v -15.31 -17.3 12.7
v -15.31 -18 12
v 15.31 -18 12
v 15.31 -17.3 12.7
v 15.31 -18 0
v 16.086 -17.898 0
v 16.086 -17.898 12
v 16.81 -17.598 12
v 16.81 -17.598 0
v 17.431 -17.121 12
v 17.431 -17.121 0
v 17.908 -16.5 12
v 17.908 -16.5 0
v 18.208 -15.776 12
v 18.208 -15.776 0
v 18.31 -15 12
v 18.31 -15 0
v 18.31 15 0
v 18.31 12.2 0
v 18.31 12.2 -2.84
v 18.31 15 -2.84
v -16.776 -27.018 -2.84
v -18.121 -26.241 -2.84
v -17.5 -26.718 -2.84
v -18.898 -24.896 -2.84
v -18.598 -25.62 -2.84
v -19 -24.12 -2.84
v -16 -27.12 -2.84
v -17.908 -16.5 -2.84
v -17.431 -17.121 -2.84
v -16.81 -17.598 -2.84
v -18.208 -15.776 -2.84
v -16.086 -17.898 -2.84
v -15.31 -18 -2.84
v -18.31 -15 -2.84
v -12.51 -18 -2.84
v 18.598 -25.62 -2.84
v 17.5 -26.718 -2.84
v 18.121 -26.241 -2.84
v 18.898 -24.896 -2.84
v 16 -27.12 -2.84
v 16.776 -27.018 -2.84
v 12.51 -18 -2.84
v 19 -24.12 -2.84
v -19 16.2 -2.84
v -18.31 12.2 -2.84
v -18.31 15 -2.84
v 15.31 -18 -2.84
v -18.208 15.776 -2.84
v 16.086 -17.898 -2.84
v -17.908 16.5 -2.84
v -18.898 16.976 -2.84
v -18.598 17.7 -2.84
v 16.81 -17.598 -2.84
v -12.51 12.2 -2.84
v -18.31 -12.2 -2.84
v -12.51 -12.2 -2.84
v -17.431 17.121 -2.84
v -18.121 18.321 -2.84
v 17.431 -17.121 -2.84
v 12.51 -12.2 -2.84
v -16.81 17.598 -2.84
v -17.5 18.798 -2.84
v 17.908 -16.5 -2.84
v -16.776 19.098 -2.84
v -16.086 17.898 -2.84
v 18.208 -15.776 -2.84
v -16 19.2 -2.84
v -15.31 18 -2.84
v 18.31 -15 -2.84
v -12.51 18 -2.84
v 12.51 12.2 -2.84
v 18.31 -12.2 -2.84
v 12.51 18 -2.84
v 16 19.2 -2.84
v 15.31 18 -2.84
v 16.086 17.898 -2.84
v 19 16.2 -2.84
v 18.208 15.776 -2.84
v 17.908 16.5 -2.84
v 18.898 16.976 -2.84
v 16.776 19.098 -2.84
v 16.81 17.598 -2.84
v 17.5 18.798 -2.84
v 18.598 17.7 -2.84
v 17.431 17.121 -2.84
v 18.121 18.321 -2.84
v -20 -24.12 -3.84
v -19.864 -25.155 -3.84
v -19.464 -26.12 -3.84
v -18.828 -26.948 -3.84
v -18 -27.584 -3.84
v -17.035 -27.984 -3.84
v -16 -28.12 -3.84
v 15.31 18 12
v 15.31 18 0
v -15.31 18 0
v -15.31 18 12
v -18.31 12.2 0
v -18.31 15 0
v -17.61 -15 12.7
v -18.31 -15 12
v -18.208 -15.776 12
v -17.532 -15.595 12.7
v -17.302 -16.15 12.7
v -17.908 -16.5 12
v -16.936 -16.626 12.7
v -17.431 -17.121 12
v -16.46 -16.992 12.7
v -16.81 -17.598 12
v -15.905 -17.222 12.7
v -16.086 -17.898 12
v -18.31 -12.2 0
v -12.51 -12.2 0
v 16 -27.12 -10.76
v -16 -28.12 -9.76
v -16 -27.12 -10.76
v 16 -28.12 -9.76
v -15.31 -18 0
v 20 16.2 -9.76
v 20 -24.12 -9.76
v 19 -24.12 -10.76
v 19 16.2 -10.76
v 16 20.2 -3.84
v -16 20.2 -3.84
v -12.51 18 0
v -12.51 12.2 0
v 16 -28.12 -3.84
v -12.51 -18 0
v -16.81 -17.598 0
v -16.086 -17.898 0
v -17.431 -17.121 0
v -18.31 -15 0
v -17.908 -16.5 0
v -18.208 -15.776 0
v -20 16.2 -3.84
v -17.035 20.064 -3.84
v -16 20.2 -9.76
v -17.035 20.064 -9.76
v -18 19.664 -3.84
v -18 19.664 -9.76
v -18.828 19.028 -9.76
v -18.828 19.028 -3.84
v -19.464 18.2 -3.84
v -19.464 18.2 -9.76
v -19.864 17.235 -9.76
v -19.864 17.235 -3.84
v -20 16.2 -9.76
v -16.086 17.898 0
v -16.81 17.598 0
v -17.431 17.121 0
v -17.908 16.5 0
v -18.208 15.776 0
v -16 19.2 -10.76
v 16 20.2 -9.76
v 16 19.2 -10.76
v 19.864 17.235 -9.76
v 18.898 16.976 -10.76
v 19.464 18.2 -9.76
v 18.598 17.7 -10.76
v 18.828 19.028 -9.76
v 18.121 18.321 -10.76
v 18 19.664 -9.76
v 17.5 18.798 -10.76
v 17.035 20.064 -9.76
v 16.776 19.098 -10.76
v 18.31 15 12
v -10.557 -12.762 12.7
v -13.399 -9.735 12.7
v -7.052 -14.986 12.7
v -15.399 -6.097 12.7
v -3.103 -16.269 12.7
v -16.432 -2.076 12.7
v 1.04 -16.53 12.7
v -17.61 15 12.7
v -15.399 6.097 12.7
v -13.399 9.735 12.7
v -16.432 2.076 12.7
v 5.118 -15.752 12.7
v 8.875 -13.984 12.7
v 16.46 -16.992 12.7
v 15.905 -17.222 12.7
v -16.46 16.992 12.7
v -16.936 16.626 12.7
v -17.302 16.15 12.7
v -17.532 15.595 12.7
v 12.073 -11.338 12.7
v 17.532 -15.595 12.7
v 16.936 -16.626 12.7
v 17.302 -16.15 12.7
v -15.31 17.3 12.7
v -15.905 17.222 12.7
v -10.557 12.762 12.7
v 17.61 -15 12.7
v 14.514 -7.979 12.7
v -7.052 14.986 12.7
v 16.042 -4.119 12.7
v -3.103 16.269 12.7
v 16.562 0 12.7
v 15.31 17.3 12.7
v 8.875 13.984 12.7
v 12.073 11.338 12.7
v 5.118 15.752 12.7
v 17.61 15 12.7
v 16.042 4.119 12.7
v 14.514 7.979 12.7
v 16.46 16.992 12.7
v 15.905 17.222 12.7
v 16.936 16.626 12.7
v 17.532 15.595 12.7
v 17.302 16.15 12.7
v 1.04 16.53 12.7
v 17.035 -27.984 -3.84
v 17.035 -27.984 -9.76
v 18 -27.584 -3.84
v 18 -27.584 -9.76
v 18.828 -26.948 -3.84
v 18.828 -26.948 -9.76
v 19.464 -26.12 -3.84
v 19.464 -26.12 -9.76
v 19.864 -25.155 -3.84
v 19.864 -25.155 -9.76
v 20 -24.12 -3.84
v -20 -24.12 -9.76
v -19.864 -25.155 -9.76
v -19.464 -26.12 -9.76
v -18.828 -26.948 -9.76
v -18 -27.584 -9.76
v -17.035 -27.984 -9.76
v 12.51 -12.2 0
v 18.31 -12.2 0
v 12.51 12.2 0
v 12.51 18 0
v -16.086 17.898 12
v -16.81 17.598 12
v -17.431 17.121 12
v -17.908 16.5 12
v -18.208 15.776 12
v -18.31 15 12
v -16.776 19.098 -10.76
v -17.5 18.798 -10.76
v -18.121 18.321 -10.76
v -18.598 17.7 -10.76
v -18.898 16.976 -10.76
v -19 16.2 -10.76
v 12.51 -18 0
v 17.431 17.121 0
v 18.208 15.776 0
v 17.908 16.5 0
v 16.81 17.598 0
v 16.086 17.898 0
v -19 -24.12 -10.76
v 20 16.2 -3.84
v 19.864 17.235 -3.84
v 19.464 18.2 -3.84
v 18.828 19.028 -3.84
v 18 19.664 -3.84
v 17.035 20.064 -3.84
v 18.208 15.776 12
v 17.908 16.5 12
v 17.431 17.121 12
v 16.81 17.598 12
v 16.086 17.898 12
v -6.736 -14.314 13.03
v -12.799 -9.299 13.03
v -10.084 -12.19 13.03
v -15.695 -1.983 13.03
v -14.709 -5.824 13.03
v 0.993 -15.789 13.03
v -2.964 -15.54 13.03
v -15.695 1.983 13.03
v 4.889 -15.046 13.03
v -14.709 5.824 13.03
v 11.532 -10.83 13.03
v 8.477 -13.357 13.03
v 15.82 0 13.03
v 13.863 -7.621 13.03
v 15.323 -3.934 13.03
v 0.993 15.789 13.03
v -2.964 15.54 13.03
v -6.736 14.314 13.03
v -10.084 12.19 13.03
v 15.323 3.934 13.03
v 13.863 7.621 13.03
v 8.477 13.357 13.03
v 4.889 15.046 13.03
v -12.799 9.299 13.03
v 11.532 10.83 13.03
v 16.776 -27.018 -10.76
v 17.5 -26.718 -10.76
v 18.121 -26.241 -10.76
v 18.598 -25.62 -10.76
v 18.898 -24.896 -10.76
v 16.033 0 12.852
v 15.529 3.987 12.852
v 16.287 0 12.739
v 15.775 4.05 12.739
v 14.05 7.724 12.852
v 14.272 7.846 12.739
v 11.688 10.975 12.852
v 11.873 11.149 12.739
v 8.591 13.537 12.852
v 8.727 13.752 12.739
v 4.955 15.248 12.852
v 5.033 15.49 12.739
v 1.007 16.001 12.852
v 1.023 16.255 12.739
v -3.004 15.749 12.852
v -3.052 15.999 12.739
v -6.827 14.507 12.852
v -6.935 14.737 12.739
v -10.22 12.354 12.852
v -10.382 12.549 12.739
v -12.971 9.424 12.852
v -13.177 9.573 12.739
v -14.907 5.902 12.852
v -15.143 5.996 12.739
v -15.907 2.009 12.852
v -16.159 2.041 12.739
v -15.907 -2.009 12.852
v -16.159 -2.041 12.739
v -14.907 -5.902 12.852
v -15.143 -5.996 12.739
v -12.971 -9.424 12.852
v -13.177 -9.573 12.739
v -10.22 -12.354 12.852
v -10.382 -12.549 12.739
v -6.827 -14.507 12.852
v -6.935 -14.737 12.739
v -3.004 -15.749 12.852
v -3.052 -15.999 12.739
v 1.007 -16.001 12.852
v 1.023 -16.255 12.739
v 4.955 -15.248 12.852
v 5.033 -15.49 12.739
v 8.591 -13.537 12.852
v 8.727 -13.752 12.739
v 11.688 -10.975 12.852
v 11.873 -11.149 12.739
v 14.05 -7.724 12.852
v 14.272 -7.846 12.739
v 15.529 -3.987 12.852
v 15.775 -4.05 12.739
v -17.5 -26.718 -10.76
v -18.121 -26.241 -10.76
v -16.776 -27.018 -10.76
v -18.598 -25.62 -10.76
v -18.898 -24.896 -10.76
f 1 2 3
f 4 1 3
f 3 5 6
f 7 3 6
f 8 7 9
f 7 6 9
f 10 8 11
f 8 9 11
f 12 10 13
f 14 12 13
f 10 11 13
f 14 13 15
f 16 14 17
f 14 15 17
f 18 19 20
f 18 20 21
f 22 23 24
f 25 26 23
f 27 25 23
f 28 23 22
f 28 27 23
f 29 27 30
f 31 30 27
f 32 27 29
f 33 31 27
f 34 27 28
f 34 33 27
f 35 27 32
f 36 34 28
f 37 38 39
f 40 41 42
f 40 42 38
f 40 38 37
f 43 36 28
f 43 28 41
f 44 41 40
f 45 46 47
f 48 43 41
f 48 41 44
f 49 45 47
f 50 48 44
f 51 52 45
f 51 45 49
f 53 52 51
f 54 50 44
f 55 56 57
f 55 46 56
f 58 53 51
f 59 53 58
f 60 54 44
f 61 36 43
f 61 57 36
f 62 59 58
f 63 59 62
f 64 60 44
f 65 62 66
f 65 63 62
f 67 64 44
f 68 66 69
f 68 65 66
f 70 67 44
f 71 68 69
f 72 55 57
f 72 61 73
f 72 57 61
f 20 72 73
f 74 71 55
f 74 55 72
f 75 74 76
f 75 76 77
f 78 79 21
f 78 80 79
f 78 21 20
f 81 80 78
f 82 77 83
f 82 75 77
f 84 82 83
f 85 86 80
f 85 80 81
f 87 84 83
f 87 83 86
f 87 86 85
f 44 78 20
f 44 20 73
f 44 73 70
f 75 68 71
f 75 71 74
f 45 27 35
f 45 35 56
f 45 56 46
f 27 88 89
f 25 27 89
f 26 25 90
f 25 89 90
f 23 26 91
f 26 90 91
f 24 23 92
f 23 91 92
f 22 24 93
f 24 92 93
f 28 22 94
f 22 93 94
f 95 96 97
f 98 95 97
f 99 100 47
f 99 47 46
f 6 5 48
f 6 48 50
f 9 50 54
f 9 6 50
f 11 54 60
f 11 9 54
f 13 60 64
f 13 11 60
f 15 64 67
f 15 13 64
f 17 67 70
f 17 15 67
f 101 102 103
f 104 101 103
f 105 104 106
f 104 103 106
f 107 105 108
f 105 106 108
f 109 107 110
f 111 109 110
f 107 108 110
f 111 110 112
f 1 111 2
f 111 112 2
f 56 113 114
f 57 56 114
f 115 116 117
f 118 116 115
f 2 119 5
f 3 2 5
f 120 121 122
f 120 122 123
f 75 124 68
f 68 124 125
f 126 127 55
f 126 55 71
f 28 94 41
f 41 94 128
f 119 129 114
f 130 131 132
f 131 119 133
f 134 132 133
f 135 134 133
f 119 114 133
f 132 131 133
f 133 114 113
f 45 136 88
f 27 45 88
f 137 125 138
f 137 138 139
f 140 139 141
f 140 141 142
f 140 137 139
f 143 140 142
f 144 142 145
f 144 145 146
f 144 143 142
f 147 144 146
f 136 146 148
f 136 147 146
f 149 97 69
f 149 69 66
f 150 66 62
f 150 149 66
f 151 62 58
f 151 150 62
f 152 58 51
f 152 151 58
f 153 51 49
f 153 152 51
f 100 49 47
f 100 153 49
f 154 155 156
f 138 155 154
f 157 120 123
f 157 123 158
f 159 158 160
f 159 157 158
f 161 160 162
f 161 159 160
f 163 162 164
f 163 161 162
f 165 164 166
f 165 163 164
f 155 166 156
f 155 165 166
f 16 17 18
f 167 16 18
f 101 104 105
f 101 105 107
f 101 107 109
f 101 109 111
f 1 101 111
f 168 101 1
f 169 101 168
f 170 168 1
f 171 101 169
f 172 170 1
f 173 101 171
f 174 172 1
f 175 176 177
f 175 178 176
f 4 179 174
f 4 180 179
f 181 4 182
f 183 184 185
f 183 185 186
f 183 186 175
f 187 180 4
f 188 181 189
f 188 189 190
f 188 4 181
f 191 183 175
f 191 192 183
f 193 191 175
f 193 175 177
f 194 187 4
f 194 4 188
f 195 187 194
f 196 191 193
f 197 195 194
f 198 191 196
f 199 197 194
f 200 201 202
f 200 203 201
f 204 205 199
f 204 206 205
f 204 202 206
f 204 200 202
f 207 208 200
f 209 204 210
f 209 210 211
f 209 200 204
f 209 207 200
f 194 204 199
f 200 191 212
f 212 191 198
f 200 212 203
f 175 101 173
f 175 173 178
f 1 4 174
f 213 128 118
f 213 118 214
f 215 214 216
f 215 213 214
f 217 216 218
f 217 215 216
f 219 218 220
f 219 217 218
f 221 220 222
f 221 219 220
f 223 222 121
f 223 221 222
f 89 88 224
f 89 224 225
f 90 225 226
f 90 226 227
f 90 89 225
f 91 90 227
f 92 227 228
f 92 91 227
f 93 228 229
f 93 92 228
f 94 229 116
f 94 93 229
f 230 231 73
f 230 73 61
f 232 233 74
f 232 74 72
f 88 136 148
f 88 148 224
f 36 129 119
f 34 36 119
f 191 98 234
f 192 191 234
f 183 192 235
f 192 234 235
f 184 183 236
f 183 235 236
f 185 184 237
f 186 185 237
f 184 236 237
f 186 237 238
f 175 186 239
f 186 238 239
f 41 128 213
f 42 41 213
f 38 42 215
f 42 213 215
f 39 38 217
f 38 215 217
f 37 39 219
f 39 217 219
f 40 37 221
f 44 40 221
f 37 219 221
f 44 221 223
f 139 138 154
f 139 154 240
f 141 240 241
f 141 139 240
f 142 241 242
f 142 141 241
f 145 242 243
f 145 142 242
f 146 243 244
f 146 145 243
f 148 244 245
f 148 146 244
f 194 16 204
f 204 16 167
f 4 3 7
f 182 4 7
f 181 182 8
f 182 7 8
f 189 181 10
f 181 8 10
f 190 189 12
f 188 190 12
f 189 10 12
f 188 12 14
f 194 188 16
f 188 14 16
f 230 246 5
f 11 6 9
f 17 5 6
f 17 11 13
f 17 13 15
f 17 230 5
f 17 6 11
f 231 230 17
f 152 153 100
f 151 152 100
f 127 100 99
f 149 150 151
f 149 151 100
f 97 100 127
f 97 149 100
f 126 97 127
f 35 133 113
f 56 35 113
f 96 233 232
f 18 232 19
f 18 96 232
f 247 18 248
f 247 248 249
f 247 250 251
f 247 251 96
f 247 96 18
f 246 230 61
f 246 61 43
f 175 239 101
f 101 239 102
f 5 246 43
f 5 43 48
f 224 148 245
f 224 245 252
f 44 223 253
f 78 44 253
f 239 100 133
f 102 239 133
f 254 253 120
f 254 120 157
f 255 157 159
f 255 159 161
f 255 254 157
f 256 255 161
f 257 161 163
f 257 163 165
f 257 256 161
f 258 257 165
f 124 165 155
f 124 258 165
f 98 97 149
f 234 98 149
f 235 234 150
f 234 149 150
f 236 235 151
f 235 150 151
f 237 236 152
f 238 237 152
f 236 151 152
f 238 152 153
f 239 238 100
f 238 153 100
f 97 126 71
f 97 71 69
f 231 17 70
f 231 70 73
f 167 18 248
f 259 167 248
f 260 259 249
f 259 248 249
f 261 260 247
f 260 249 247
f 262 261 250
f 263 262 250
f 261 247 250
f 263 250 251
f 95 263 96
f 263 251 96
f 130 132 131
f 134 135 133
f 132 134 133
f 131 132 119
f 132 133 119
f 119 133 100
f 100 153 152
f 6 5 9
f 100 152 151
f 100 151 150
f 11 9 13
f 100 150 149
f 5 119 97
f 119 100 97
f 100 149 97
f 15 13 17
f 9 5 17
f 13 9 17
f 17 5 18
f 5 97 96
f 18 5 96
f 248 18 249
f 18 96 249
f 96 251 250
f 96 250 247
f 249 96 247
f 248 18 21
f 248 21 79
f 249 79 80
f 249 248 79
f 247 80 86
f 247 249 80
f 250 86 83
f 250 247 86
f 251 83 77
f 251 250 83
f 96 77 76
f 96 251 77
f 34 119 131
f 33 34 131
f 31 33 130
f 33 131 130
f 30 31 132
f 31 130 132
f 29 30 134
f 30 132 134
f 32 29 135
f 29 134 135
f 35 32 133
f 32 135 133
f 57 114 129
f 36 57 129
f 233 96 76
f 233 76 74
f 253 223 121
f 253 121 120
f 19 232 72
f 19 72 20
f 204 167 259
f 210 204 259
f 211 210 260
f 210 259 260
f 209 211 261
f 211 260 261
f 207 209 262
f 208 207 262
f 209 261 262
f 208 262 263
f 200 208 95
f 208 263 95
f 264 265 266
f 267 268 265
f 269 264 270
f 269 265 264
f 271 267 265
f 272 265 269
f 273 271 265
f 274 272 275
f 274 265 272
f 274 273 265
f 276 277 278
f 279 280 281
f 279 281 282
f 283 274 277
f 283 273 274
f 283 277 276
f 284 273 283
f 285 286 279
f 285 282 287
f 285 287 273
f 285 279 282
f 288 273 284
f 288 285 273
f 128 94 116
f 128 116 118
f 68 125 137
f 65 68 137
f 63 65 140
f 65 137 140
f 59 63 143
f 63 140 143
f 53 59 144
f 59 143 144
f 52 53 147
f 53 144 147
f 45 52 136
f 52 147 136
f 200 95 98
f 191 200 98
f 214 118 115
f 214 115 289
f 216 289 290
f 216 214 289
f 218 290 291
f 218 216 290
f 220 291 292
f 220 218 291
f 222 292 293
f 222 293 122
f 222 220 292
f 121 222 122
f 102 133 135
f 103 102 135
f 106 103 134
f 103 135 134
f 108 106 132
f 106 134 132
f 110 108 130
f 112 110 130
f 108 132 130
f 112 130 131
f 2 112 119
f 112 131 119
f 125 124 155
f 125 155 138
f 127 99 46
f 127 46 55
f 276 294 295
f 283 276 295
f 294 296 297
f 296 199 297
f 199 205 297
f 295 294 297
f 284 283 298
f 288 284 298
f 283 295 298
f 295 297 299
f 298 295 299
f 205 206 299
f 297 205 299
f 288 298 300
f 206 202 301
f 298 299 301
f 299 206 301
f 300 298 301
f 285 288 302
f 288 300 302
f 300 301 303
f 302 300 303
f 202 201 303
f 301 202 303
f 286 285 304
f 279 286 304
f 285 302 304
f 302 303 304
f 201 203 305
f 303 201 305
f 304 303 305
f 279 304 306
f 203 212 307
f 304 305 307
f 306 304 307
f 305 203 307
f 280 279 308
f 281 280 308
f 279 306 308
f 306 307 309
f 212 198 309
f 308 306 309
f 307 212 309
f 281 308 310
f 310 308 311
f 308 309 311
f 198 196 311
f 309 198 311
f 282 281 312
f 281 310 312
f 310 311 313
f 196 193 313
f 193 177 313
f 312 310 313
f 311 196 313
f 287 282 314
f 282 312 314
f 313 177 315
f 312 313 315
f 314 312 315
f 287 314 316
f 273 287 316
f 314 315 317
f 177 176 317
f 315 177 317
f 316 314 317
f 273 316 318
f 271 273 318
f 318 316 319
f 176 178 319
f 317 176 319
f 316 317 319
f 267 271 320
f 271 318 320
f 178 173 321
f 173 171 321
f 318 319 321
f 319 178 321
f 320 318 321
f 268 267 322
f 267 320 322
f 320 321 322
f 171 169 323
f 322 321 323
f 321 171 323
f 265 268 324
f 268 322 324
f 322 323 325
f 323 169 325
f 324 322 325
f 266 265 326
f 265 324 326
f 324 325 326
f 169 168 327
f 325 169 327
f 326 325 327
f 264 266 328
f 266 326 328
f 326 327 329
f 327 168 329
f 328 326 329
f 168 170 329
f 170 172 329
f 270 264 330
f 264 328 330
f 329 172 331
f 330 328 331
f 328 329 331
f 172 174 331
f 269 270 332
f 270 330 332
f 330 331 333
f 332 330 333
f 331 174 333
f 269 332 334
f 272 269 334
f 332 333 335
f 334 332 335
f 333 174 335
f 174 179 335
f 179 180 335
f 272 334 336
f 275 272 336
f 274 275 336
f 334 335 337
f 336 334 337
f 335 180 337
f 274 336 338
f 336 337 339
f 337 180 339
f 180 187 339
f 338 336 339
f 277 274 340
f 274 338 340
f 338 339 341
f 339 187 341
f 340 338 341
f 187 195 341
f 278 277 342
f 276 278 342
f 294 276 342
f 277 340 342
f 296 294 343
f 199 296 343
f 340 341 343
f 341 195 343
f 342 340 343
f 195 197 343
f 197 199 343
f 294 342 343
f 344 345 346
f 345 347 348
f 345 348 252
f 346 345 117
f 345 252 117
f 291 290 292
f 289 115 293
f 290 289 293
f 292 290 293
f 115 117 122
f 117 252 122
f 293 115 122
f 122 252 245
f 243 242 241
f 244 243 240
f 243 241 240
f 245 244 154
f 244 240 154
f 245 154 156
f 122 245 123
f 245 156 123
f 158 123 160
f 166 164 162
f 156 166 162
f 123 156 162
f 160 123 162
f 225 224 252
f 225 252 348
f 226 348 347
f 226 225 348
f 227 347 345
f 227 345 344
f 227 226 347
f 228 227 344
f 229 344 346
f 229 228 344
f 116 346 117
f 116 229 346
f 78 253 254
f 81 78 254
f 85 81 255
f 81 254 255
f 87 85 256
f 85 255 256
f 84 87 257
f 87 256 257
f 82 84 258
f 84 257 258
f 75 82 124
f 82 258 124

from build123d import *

# Parameters (mm, degrees)
BOSS_EXTRUDE1_DEPTH   = 12.7
SKETCH7_R             = 15.82
BOSS_EXTRUDE5_DEPTH   = 0.33
FILLET1_R             = 1
CHAMFER1_SIZE         = 0.7
BOSS_EXTRUDE6_DEPTH   = 2.84
BOSS_EXTRUDE6_2_DEPTH = 2.84
BOSS_EXTRUDE6_3_DEPTH = 2.84
BOSS_EXTRUDE6_4_DEPTH = 2.84
BOSS_EXTRUDE7_DEPTH   = 7.92
CHAMFER2_SIZE         = 1


with BuildPart() as part:
    # Sketch2 → Boss-Extrude1 (new body)
    with BuildSketch(Plane.XY):
        with BuildLine():
            Line((-15.31, -18), (15.31, -18))
            ThreePointArc((15.31, -18), (17.431320344, -17.121320344), (18.31, -15))
            Line((18.31, -15), (18.31, 15))
            ThreePointArc((18.31, 15), (17.431320344, 17.121320344), (15.31, 18))
            Line((15.31, 18), (-15.31, 18))
            ThreePointArc((-15.31, 18), (-17.431320344, 17.121320344), (-18.31, 15))
            Line((-18.31, 15), (-18.31, -15))
            ThreePointArc((-18.31, -15), (-17.431320344, -17.121320344), (-15.31, -18))
        make_face()
    extrude(amount=BOSS_EXTRUDE1_DEPTH)

    # Sketch7 → Boss-Extrude5 (add)
    with BuildSketch(Plane.XY.offset(12.7)):
        Circle(SKETCH7_R)
    extrude(amount=BOSS_EXTRUDE5_DEPTH)

    # Fillet1
    # the kernel refuses this fillet: 1 mm, written as the material it adds along each edge
    with BuildSketch(Plane(origin=(0, 0, 12.7), x_dir=(1, 0, 0), z_dir=(0, -1, 0))) as fillet1_piece_1:
        with BuildLine():
            CenterArc((16.562361098, 1), FILLET1_R, 222.067064802, 47.932935198)
            Line((15.82, 0.33), (15.805152778, 0.3166))
            ThreePointArc((15.805152778, 0.3166), (15.8, 0.165), (15.8, 0))
            Line((15.8, 0), (15.82, -0.02))
            Line((15.82, -0.02), (16.562361098, -0.02))
            Line((16.562361098, -0.02), (16.562361098, 0))
        make_face()
    revolve(axis=Axis((0, 0, 12.7), (0, 0, 1)))

    # Chamfer1
    chamfer1_edges = [part.edges().sort_by_distance(p)[0] for p in [
        (17.431320344, -17.121320344, 12.7),
        (18.31, 0, 12.7),
        (17.431320344, 17.121320344, 12.7),
        (0, 18, 12.7),
        (-17.431320344, 17.121320344, 12.7),
        (-18.31, 0, 12.7),
        (-17.431320344, -17.121320344, 12.7),
        (0, -18, 12.7),
    ]]
    chamfer(chamfer1_edges, length=CHAMFER1_SIZE)


with BuildPart() as body_2:
    # Sketch8 → Boss-Extrude6 (new body)
    with BuildSketch(Plane(origin=(0, 0, 0), x_dir=(-1, 0, 0), z_dir=(0, 0, -1))):
        with BuildLine():
            Line((-12.51, 12.2), (-18.31, 12.2))
            Line((-18.31, 12.2), (-18.31, 15))
            ThreePointArc((-18.31, 15), (-17.431320344, 17.121320344), (-15.31, 18))
            Line((-15.31, 18), (-12.51, 18))
            Line((-12.51, 18), (-12.51, 12.2))
        make_face()
    extrude(amount=BOSS_EXTRUDE6_DEPTH)



with BuildPart() as body_3:
    # Sketch8 → Boss-Extrude6 2 (new body)
    with BuildSketch(Plane(origin=(0, 0, 0), x_dir=(-1, 0, 0), z_dir=(0, 0, -1))):
        with BuildLine():
            Line((12.51, 18), (15.31, 18))
            ThreePointArc((15.31, 18), (17.431320344, 17.121320344), (18.31, 15))
            Line((18.31, 15), (18.31, 12.2))
            Line((18.31, 12.2), (12.51, 12.2))
            Line((12.51, 12.2), (12.51, 18))
        make_face()
    extrude(amount=BOSS_EXTRUDE6_2_DEPTH)


with BuildPart() as body_4:
    # Sketch8 → Boss-Extrude6 3 (new body)
    with BuildSketch(Plane(origin=(0, 0, 0), x_dir=(-1, 0, 0), z_dir=(0, 0, -1))):
        with BuildLine():
            Line((-12.51, -18), (-15.31, -18))
            ThreePointArc((-15.31, -18), (-17.431320344, -17.121320344), (-18.31, -15))
            Line((-18.31, -15), (-18.31, -12.2))
            Line((-18.31, -12.2), (-12.51, -12.2))
            Line((-12.51, -12.2), (-12.51, -18))
        make_face()
    extrude(amount=BOSS_EXTRUDE6_3_DEPTH)


with BuildPart() as body_5:
    # Sketch8 → Boss-Extrude6 4 (new body)
    with BuildSketch(Plane(origin=(0, 0, 0), x_dir=(-1, 0, 0), z_dir=(0, 0, -1))):
        with BuildLine():
            Line((12.51, -12.2), (12.51, -18))
            Line((12.51, -18), (15.31, -18))
            ThreePointArc((15.31, -18), (17.431320344, -17.121320344), (18.31, -15))
            Line((18.31, -15), (18.31, -12.2))
            Line((18.31, -12.2), (12.51, -12.2))
        make_face()
    extrude(amount=BOSS_EXTRUDE6_4_DEPTH)


with BuildPart() as body_2_1:
    add(body_2.part)

    add(body_3.part)  # Boss-Extrude7 merges body 3

    add(body_4.part)  # Boss-Extrude7 merges body 4

    add(body_5.part)  # Boss-Extrude7 merges body 5
    # Sketch9 → Boss-Extrude7 (add)
    with BuildSketch(Plane(origin=(0, 0, -2.84), x_dir=(-1, 0, 0), z_dir=(0, 0, -1))):
        with BuildLine():
            Line((-16, 20.2), (16, 20.2))
            ThreePointArc((16, 20.2), (18.828427125, 19.028427125), (20, 16.2))
            Line((20, 16.2), (20, -24.12))
            ThreePointArc((20, -24.12), (18.828427125, -26.948427125), (16, -28.12))
            Line((16, -28.12), (-16, -28.12))
            ThreePointArc((-16, -28.12), (-18.828427125, -26.948427125), (-20, -24.12))
            Line((-20, -24.12), (-20, 16.2))
            ThreePointArc((-20, 16.2), (-18.828427125, 19.028427125), (-16, 20.2))
        make_face()
    extrude(amount=BOSS_EXTRUDE7_DEPTH)

    # Chamfer2
    chamfer2_edges = [body_2_1.edges().sort_by_distance(p)[0] for p in [
        (18.828427125, -26.948427125, -2.84),
        (0, -28.12, -2.84),
        (-18.828427125, -26.948427125, -2.84),
        (-20, -3.96, -2.84),
        (-18.828427125, 19.028427125, -2.84),
        (0, 20.2, -2.84),
        (18.828427125, 19.028427125, -2.84),
        (20, -3.96, -2.84),
        (18.828427125, -26.948427125, -10.76),
        (0, -28.12, -10.76),
        (-18.828427125, -26.948427125, -10.76),
        (-20, -3.96, -10.76),
        (-18.828427125, 19.028427125, -10.76),
        (0, 20.2, -10.76),
        (18.828427125, 19.028427125, -10.76),
        (20, -3.96, -10.76),
    ]]
    chamfer(chamfer2_edges, length=CHAMFER2_SIZE)


solid = Compound([part.part, body_2_1.part])
